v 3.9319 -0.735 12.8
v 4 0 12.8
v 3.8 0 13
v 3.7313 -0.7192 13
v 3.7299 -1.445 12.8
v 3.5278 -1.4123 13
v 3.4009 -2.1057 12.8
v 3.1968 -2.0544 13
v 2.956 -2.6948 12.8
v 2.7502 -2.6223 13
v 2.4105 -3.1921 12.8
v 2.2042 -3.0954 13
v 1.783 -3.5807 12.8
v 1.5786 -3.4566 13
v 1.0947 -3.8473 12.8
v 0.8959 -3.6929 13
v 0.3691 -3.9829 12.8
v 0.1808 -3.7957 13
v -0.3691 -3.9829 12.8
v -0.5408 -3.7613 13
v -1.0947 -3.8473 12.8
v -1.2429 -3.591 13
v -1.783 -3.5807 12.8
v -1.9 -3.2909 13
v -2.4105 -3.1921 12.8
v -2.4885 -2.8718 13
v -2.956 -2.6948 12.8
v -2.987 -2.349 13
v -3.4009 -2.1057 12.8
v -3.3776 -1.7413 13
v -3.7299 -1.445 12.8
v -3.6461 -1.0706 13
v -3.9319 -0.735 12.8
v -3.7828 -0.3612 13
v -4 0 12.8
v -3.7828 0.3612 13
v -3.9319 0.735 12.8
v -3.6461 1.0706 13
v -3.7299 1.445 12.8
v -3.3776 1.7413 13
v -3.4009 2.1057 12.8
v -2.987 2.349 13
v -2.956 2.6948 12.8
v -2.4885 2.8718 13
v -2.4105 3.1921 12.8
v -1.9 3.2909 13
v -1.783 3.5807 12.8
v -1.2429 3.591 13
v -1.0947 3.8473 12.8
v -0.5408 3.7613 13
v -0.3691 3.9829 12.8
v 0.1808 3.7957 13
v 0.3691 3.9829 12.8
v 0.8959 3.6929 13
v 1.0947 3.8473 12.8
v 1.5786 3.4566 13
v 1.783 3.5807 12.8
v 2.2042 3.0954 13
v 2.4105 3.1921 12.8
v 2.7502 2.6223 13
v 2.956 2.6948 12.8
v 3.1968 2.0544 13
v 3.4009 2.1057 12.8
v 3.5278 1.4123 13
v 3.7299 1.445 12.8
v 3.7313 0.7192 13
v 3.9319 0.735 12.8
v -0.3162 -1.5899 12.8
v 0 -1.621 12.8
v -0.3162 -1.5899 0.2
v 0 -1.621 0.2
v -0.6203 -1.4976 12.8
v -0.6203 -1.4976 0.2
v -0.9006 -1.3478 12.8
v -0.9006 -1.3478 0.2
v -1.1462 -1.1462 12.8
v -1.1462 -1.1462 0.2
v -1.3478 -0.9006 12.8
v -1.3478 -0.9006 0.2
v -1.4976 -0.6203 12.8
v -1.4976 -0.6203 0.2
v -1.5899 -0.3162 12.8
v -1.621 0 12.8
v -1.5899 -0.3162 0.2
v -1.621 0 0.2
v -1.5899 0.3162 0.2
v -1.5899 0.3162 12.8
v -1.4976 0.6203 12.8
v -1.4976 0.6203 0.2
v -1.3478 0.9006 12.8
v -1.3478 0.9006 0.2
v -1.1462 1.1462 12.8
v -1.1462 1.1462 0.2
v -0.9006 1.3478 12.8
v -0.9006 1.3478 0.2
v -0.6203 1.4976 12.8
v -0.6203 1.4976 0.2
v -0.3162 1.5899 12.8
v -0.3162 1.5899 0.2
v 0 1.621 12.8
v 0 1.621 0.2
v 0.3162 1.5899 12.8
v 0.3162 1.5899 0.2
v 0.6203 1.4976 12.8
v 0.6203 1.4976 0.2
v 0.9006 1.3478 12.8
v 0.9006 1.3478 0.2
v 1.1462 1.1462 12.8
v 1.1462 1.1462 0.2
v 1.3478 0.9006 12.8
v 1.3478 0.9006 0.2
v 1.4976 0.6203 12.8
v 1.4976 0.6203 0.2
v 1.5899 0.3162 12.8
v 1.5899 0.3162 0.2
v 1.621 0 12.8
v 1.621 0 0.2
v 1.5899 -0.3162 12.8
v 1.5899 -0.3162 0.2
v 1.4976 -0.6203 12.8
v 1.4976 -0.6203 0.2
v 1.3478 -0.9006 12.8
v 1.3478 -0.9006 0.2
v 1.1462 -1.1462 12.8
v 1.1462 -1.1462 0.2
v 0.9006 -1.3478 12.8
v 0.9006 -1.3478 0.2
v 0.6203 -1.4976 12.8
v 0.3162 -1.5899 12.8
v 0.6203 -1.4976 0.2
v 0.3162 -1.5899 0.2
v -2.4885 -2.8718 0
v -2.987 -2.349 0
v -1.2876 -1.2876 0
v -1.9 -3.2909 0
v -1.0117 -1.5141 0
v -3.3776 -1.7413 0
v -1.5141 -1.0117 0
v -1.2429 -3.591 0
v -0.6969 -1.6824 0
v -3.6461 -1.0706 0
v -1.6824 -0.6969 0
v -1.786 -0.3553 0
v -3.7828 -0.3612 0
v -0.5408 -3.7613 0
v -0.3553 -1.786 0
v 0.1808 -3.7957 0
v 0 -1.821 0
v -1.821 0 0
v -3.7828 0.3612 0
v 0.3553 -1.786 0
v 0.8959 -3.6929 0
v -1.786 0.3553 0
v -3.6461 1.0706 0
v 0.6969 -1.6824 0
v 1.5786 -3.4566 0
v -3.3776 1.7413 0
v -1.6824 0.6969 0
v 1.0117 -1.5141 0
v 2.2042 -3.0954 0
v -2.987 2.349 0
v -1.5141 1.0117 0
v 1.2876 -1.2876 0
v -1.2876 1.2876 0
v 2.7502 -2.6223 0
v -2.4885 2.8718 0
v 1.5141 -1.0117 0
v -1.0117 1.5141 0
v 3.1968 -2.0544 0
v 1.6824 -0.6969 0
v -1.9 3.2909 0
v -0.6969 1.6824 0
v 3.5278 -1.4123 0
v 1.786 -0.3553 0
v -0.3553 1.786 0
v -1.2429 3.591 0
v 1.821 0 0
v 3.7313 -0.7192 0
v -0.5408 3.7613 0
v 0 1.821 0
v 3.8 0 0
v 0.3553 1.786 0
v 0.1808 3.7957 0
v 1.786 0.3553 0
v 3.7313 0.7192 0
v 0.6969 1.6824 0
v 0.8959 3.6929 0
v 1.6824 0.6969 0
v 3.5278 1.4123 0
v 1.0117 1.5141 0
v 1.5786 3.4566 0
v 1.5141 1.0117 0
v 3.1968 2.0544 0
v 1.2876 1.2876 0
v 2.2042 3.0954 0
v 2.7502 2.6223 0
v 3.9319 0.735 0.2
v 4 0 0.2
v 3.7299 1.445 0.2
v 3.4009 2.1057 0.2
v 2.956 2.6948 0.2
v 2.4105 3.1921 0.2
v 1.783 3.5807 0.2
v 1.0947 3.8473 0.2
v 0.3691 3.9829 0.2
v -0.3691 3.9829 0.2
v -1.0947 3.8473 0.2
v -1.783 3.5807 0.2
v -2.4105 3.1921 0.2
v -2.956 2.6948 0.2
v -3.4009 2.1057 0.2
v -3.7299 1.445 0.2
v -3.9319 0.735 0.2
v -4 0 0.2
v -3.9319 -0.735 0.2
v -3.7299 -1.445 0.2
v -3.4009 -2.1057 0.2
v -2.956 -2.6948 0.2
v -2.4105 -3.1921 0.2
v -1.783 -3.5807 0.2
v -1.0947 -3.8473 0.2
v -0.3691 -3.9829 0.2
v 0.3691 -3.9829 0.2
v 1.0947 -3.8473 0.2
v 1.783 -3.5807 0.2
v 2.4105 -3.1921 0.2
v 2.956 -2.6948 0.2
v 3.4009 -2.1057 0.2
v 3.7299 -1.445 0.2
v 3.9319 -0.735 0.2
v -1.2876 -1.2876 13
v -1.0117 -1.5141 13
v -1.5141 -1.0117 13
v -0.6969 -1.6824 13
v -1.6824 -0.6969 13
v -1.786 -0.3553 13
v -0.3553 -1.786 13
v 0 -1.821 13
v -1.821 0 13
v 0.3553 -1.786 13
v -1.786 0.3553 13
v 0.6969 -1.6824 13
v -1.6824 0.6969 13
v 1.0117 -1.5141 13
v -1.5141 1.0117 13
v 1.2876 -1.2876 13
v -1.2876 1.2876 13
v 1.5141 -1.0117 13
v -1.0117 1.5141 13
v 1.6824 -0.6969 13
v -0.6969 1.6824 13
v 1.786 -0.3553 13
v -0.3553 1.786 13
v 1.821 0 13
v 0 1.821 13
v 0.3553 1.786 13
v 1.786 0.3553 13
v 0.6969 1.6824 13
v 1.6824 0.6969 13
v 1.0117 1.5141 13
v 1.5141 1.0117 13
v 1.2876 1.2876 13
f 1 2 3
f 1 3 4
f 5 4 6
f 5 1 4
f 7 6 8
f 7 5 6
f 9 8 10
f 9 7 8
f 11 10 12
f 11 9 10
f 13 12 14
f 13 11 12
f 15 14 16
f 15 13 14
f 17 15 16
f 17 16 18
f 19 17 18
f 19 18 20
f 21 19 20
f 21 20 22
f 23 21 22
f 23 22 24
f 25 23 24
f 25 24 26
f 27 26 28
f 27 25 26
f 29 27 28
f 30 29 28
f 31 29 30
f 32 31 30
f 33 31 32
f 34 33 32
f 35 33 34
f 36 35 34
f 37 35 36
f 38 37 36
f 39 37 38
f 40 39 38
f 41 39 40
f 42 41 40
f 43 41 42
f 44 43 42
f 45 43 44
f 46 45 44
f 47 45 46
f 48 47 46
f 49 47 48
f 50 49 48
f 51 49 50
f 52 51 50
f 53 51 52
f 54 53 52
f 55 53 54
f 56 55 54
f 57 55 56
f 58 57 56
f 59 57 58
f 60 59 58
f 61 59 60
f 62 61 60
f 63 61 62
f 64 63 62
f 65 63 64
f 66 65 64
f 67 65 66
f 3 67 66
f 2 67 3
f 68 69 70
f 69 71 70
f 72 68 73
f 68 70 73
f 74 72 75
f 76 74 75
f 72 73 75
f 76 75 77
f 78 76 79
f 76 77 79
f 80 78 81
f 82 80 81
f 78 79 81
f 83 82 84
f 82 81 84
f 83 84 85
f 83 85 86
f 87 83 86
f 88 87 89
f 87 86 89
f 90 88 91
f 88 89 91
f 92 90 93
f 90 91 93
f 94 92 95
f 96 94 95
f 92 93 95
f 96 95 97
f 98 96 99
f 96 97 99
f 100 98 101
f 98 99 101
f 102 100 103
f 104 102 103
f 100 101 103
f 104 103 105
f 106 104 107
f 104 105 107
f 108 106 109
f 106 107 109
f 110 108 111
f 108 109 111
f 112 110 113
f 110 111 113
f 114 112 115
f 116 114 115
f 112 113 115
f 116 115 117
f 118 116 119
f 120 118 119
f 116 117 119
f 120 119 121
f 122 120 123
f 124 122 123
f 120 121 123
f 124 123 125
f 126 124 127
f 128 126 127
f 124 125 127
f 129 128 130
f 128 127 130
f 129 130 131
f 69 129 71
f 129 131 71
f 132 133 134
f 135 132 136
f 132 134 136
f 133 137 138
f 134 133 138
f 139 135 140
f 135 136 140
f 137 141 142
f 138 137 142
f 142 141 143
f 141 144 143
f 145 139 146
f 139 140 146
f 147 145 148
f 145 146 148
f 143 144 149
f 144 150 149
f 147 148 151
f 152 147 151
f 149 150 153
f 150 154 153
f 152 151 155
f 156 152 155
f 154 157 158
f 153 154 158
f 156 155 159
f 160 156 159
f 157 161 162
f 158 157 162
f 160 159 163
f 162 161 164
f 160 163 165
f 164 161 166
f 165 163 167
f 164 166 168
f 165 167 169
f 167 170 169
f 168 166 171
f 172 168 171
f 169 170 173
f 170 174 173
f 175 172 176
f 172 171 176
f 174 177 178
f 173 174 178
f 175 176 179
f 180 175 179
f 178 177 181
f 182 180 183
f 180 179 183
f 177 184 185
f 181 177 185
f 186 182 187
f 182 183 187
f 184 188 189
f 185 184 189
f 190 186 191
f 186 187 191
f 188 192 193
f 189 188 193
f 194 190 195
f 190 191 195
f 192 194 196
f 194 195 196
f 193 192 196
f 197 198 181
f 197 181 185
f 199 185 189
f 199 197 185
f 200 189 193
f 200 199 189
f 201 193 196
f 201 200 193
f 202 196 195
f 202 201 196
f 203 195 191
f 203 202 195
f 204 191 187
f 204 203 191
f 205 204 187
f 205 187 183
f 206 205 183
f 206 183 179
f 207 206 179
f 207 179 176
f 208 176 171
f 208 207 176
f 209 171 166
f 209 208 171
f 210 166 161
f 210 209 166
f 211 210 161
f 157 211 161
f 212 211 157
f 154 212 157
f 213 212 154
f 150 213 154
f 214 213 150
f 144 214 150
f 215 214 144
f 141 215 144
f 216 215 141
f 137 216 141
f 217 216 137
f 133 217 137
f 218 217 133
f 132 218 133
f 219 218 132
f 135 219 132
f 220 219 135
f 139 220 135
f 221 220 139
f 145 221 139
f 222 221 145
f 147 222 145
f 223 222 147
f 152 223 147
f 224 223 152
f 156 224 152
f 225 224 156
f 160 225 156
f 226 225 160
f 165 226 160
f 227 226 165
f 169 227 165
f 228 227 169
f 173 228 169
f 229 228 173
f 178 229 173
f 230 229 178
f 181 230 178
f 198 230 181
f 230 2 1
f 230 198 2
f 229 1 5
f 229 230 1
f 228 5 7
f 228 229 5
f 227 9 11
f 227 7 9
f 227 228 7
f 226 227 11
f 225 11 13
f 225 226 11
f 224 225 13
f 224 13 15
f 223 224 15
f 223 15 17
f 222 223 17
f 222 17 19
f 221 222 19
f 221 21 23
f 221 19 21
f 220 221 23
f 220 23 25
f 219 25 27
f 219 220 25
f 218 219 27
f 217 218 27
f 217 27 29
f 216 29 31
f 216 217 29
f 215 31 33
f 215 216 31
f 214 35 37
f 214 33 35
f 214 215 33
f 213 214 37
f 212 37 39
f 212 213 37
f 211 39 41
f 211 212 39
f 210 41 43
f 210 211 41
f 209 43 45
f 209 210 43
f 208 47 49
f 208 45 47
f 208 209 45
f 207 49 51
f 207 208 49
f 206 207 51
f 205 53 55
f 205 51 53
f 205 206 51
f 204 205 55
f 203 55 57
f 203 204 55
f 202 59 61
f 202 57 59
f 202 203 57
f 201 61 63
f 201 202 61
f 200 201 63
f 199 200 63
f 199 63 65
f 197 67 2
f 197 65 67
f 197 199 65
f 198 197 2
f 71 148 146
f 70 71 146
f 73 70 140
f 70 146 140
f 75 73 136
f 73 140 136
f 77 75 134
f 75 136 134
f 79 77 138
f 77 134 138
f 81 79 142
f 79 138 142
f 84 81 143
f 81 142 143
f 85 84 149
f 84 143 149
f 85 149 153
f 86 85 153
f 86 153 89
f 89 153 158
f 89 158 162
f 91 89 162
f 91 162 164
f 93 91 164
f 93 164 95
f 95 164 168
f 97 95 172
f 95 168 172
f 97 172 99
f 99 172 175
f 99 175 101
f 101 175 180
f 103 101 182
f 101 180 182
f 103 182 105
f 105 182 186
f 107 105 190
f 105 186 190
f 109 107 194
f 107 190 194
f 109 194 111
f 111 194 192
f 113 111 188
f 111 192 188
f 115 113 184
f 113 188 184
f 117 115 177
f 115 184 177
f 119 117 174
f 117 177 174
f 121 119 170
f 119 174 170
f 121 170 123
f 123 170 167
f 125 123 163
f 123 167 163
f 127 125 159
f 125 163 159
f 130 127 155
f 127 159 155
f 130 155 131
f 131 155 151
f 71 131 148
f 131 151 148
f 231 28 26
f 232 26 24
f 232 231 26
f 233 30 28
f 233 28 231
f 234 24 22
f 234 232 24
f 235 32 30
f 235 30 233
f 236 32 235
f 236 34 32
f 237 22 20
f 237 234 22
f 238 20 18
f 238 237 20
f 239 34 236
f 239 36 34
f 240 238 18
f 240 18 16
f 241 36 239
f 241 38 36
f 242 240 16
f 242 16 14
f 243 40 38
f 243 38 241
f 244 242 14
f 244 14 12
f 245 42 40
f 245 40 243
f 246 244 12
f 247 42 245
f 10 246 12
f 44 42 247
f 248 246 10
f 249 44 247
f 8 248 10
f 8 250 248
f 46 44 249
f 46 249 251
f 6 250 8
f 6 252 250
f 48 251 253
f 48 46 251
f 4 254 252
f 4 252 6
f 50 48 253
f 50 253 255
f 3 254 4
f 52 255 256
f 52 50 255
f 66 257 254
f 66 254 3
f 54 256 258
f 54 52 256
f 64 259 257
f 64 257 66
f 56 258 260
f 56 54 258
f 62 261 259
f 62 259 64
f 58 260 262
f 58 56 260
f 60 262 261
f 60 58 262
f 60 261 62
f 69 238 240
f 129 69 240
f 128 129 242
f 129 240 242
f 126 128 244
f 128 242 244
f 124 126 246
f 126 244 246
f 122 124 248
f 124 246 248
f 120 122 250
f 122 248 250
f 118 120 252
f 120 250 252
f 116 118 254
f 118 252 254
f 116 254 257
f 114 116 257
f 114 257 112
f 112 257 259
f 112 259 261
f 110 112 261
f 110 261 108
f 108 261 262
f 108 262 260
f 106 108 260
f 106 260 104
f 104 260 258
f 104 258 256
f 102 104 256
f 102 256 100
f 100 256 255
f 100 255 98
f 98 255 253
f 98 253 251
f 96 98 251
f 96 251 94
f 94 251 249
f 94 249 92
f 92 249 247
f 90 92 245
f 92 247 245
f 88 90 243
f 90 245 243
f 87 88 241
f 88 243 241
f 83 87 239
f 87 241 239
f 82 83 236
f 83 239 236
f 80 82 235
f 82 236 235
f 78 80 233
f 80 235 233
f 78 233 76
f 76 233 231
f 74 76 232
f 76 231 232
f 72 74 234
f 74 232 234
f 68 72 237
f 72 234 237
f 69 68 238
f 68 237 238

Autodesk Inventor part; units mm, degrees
ref_plane "YZ Plane" through (0, 0, 0) normal (1, 0, 0) x (0, 1, 0)
ref_plane "XZ Plane" through (0, 0, 0) normal (0, 1, 0) x (-1, 0, 0)
ref_plane "XY Plane" through (0, 0, 0) normal (0, 0, 1) x (1, 0, 0)
sketch "スケッチ1" plane through (0, 0, 0) normal (0, 0, 1) x (1, 0, 0)
  circle A0 centre (0, 0) radius 4
  dimension "d13" = 8
extrude "押し出し1" add sketch "スケッチ1" along normal blind 13
sketch "スケッチ2" plane through (0, 0, 13) normal (0, 0, 1) x (1, 0, 0)
  point P0 (0, 0)
  point P1 (0, 0)
hole "穴1" at (0, 0, 13) direction (0, 0, -1) diameter 3.242 end through all thread size "M4x0.7" class "6H" standard "ANSI Metric M Profile"
chamfer "面取り1" distance 0.2 angle 45 4 edges at (0, 1.621, 13) (0, 1.621, 0) (-4, 0, 13) (-4, 0, 0)
properties part number "unir-spacer1" material "鋼、炭素鋼"
